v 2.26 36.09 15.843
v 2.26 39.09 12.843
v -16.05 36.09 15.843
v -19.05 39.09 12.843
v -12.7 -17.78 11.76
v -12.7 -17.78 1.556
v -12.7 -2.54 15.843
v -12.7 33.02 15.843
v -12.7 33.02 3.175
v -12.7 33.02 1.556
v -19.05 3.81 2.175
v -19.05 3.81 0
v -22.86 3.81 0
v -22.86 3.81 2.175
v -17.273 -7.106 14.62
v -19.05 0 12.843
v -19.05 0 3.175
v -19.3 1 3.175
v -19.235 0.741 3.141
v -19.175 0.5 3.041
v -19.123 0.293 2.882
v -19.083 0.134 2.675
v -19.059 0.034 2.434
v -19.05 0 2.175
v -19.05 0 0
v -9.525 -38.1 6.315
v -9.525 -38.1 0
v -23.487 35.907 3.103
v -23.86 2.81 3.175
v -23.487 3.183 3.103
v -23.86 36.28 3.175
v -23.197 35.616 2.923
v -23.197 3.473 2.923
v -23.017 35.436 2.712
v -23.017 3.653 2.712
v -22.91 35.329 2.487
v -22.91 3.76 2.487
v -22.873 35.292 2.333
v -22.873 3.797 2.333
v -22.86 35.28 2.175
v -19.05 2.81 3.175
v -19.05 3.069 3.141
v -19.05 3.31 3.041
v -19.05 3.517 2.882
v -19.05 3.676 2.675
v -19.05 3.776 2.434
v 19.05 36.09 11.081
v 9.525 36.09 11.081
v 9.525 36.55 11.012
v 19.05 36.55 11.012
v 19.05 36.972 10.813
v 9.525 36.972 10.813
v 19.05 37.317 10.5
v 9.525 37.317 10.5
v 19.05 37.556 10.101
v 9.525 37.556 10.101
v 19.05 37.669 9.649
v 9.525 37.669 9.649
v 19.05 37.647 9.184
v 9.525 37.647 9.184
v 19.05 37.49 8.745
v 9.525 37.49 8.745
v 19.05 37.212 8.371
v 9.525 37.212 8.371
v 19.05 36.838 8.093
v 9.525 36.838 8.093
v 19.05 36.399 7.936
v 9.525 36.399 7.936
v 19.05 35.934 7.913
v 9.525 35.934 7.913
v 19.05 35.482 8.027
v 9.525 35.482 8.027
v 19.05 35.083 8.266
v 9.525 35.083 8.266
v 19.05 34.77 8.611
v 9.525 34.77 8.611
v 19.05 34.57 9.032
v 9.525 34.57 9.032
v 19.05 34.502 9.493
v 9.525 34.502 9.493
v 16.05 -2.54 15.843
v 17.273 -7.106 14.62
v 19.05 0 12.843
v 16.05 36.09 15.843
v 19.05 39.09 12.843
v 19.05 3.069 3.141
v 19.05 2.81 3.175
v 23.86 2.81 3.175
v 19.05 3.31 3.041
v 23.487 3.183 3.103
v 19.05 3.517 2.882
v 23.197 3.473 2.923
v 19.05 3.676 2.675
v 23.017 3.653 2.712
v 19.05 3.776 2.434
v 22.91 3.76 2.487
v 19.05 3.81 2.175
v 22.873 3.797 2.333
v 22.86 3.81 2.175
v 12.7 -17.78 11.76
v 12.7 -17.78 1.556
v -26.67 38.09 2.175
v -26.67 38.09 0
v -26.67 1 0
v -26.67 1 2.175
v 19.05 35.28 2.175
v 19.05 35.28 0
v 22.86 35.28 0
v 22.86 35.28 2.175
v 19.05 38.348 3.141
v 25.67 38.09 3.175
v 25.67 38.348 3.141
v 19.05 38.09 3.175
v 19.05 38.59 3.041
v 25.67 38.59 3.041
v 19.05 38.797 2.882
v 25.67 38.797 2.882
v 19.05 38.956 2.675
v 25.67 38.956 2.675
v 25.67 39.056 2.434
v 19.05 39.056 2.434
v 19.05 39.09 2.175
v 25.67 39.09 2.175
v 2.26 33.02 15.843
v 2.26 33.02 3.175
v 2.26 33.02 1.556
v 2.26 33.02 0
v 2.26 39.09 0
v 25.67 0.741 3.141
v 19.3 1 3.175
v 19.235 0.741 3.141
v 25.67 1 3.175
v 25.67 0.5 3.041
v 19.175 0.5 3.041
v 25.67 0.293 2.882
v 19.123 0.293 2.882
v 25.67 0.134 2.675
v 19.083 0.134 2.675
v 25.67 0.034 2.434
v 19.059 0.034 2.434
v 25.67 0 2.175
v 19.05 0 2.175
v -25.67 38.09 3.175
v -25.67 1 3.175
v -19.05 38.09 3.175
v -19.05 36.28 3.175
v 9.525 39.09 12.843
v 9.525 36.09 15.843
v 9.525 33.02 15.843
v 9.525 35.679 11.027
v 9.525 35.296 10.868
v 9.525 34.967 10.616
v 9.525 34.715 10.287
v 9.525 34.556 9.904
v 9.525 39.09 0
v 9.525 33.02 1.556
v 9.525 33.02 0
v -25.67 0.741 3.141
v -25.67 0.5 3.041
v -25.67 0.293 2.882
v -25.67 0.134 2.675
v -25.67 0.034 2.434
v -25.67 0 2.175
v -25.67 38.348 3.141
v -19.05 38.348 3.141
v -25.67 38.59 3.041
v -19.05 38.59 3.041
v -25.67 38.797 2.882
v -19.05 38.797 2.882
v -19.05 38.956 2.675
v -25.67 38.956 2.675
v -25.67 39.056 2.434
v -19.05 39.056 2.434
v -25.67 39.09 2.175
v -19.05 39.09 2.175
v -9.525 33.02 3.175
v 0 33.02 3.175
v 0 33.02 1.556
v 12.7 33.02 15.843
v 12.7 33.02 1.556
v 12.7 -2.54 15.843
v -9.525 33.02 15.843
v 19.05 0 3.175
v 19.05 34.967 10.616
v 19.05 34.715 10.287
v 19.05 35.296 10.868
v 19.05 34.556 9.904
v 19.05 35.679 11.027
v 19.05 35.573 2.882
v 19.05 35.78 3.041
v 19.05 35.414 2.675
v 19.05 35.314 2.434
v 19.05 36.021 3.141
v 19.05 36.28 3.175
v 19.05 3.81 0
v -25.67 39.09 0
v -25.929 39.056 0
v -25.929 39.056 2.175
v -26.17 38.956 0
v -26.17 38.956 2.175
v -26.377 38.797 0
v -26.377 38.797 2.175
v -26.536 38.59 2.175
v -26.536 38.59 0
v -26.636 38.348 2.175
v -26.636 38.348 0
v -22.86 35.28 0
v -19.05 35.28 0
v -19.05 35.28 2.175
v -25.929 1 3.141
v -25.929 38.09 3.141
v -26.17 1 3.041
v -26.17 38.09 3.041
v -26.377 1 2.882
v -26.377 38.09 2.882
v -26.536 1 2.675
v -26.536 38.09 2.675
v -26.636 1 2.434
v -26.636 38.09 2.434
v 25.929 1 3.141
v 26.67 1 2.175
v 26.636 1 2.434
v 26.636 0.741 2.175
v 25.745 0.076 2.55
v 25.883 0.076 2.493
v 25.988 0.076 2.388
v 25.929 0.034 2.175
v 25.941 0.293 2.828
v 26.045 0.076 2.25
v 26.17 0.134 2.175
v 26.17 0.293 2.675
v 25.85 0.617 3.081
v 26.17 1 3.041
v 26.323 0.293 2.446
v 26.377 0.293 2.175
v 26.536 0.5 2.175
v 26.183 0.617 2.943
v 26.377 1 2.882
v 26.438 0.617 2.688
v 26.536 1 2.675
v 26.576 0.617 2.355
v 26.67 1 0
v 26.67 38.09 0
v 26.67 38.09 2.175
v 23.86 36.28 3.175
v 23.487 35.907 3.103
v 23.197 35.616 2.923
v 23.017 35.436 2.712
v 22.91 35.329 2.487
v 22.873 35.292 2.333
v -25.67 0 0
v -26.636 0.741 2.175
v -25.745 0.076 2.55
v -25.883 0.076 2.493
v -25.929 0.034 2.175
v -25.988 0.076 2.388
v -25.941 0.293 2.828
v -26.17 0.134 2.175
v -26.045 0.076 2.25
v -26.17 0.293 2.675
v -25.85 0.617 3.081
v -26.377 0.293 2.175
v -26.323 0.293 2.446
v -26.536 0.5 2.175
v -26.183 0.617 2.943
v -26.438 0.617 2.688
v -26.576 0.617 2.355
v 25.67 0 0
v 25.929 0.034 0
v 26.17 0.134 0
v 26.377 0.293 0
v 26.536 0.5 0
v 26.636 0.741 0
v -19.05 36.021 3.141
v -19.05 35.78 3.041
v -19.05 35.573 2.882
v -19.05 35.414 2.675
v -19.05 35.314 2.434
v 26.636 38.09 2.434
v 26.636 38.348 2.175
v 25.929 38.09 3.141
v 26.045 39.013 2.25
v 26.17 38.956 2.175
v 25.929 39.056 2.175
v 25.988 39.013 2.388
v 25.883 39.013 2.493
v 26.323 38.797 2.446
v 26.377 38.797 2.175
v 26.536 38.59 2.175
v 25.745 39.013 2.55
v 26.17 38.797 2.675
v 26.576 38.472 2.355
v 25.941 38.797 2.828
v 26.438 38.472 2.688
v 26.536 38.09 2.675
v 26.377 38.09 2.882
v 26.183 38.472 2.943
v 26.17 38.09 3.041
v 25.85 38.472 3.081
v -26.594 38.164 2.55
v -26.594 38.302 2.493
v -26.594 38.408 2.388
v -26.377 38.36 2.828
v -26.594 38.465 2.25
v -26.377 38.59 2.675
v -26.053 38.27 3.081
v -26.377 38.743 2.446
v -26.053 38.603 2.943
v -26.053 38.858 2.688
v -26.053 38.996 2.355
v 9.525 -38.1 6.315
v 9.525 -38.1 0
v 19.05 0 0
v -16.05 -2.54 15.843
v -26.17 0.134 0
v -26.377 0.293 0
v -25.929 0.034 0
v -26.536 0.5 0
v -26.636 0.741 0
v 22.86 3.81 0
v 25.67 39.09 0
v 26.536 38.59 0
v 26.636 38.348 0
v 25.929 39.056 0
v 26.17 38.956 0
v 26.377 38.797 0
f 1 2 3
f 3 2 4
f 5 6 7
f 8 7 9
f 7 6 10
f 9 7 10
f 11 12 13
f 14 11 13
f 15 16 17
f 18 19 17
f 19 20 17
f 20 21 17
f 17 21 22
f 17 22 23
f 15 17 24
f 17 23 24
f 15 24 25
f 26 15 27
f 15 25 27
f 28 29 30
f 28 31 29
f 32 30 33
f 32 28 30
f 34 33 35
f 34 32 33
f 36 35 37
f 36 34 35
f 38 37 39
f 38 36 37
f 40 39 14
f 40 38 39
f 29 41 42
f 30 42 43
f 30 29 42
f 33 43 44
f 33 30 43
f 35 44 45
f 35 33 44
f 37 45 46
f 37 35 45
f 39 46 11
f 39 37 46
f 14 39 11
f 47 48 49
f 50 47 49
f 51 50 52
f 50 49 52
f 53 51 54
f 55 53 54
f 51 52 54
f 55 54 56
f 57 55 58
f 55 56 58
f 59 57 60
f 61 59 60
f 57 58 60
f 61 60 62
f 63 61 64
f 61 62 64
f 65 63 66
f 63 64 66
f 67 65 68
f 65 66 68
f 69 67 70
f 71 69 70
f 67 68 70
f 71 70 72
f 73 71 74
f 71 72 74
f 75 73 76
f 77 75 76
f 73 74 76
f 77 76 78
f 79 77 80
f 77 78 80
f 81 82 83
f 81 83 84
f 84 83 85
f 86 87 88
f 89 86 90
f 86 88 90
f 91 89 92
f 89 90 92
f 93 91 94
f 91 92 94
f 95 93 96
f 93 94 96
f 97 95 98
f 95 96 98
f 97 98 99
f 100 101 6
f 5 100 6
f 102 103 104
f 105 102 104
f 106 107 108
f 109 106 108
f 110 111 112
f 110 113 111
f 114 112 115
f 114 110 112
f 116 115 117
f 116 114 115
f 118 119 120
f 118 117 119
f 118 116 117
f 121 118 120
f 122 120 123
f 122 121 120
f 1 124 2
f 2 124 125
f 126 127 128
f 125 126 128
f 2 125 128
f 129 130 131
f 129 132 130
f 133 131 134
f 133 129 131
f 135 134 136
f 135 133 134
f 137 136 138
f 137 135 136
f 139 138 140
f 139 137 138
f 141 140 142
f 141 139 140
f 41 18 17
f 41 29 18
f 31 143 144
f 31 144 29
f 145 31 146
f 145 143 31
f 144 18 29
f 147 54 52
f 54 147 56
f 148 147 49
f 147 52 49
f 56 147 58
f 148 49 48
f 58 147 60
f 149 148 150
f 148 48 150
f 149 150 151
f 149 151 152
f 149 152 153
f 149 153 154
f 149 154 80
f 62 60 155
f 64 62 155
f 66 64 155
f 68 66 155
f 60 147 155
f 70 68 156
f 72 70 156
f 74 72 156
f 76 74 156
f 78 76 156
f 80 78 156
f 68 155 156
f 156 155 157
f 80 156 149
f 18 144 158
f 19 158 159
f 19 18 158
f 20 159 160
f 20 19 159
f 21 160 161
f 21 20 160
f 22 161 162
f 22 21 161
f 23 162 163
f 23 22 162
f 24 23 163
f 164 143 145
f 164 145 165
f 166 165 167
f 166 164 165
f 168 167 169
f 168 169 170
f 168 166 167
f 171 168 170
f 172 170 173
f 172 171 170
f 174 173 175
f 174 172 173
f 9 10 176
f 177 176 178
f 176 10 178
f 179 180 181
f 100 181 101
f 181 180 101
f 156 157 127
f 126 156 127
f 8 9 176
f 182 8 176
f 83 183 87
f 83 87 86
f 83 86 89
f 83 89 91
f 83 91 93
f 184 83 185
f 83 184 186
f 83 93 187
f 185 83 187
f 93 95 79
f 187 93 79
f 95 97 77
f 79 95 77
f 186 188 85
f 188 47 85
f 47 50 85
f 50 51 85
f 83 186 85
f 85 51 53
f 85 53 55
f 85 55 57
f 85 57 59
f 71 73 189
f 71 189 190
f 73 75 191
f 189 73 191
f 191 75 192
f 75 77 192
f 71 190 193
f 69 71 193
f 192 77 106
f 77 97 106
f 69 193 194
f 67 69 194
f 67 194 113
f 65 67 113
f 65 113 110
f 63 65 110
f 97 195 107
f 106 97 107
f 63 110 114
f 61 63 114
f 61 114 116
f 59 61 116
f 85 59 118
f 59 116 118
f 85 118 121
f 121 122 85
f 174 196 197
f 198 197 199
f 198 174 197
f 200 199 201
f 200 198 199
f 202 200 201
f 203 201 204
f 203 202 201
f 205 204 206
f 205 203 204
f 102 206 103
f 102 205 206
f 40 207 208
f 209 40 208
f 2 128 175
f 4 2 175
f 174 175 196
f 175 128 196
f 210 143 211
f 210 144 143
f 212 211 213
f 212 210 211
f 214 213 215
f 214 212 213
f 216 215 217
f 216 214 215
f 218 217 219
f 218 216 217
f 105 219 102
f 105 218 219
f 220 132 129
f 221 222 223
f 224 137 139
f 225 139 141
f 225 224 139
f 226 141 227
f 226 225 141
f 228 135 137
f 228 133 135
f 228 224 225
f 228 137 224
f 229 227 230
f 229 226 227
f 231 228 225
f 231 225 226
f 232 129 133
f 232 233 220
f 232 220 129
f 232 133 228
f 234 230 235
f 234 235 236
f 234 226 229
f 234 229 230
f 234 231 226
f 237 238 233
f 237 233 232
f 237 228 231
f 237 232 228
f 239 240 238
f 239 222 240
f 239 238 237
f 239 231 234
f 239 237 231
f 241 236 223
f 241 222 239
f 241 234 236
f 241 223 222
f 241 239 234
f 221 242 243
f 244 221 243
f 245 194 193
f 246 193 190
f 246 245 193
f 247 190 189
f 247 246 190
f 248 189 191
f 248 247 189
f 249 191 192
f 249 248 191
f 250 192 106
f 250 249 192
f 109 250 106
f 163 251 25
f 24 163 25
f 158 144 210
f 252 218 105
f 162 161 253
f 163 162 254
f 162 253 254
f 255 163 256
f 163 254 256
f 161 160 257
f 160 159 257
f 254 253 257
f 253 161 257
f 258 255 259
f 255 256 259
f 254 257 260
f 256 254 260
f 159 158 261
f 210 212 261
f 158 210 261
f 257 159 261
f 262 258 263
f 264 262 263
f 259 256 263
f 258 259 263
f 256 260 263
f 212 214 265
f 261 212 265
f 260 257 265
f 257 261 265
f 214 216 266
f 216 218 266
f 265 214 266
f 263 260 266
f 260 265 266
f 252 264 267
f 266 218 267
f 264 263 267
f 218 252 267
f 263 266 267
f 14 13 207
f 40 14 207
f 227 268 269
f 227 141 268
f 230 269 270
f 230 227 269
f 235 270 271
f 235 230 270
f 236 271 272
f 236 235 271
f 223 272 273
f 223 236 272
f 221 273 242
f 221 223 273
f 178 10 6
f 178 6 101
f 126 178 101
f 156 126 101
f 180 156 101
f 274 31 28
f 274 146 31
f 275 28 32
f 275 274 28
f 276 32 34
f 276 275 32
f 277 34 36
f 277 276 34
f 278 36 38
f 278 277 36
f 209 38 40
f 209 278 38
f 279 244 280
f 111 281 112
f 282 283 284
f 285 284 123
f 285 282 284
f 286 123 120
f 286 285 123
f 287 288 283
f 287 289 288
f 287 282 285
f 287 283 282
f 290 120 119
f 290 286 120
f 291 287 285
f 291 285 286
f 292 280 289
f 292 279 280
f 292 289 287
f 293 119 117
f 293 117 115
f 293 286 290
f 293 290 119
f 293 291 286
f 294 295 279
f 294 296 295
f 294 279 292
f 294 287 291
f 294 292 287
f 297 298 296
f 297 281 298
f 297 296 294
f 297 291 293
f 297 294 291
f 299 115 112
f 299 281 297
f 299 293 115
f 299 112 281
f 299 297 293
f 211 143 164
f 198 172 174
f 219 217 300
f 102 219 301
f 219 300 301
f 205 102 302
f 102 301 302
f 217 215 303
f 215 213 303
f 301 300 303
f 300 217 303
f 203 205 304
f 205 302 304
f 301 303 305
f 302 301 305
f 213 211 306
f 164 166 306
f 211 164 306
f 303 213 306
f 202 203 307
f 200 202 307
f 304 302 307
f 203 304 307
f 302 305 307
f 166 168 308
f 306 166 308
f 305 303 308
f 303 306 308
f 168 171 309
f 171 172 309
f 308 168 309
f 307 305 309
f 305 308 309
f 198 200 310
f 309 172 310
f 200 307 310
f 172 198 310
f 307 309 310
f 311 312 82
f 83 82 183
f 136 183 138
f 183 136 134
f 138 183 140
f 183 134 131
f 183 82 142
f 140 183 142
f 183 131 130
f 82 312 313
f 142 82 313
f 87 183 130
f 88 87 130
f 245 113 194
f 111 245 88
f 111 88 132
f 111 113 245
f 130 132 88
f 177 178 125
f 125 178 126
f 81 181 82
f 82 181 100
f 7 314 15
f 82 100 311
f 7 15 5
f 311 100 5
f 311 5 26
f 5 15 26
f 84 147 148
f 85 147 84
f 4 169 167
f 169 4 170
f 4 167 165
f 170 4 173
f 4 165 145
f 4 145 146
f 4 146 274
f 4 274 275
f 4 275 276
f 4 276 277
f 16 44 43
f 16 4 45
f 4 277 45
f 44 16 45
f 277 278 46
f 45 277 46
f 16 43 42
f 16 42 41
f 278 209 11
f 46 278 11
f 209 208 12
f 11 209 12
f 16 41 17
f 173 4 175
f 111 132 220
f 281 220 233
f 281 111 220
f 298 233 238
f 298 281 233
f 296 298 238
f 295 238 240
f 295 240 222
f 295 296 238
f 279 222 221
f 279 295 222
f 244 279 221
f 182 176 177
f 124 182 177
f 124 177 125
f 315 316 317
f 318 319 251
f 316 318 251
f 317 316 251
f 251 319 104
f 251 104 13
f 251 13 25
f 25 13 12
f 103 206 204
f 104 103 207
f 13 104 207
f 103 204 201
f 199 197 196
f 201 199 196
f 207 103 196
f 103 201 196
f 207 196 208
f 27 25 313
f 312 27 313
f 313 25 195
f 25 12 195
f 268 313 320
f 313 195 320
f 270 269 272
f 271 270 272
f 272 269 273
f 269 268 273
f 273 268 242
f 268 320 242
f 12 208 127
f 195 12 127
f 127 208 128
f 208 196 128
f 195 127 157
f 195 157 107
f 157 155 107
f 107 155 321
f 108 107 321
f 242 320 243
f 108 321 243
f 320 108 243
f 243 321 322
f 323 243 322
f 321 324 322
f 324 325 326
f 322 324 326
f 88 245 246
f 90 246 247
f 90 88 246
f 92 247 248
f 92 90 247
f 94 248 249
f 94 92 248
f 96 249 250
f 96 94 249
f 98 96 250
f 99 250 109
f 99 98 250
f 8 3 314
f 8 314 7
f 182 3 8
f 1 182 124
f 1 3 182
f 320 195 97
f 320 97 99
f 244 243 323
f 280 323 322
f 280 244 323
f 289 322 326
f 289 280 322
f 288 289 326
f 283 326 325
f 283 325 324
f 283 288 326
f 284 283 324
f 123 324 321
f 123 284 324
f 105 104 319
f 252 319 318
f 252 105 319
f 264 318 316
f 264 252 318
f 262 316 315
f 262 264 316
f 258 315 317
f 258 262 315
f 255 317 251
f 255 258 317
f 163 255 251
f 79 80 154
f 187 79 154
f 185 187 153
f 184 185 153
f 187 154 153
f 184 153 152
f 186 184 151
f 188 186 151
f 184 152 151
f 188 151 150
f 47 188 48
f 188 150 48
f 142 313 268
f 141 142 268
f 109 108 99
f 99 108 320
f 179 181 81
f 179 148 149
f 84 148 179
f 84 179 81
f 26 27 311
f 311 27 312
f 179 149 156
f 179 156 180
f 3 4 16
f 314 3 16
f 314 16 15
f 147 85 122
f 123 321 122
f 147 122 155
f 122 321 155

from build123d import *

# Parameters (mm, degrees)
F0_W        = 9.525
F0_H        = 13.4751944874
F0_W_2      = 3.175
F0_H_2      = 15.7348055126
F0_H_3      = 17.78
F0_H_4      = 3.81
F1_DEPTH    = 1.55575
F0_W_3      = 3.81
F0_H_5      = 31.4696110251
F0_W_4      = 6.35
F0_H_6      = 1.27
F0_H_7      = 19.05
F0_H_8      = 2.2596110251
F0_W_5      = 2.2601685487
F2_DEPTH    = 3.175
F3_R        = 1
F4_DEPTH    = 15.84325
F5_SIZE     = 3
F6_T1_DEPTH = 203.7288380727
F8_DEPTH    = 25.4


# Not quite as in the source:
# - a fillet or chamfer that OpenCascade refuses, or shapes differently, is made with other operations: its cross-section is extruded or revolved along the edge and cut away or added


with BuildPart() as f1:
    # F0 (on Top) → F1 (new body)
    with BuildSketch(Plane.XY):
        with Locations((-4.7625, 26.2824027563)):
            Rectangle(F0_W, F0_H)
        with Locations((-11.1125, 26.2824027563)):
            Rectangle(F0_W_2, F0_H)
        with Locations((-11.1125, 11.6774027563)):
            Rectangle(F0_W_2, F0_H_2)
        with Locations((-4.7625, 11.6774027563)):
            Rectangle(F0_W, F0_H_2)
        with Locations((4.7625, 11.6774027563)):
            Rectangle(F0_W, F0_H_2)
        with Locations((11.1125, 11.6774027563)):
            Rectangle(F0_W_2, F0_H_2)
        with Locations((11.1125, 26.2824027563)):
            Rectangle(F0_W_2, F0_H)
        Polygon((0, 33.02), (0, 19.5448055126), (9.525, 19.5448055126), (9.525, 33.02), (2.2601685487, 33.02), align=None)
        with Locations((-4.7625, -8.89)):
            Rectangle(F0_W, F0_H_3)
        with Locations((4.7625, -8.89)):
            Rectangle(F0_W, F0_H_3)
        with Locations((11.1125, -8.89)):
            Rectangle(F0_W_2, F0_H_3)
        with Locations((-11.1125, -8.89)):
            Rectangle(F0_W_2, F0_H_3)
        with Locations((-11.1125, 1.905)):
            Rectangle(F0_W_2, F0_H_4)
        with Locations((-4.7625, 1.905)):
            Rectangle(F0_W, F0_H_4)
        with Locations((4.7625, 1.905)):
            Rectangle(F0_W, F0_H_4)
        with Locations((11.1125, 1.905)):
            Rectangle(F0_W_2, F0_H_4)
    extrude(amount=F1_DEPTH)

    # F0 (on Top) → F2 (join)
    with BuildSketch(Plane.XY):
        Polygon((-12.7, 33.02), (-9.525, 33.02), (-9.525, 35.2796110251), (-19.05, 35.2796110251), (-19.05, 19.5448055126), (-12.7, 19.5448055126), align=None)
        with Locations((-14.2875, 37.1846110251)):
            Rectangle(F0_W, F0_H_4)
        with Locations((-20.955, 37.1846110251)):
            Rectangle(F0_W_3, F0_H_4)
        with Locations((-24.765, 37.1846110251)):
            Rectangle(F0_W_3, F0_H_4)
        with Locations((-24.765, 19.5448055126)):
            Rectangle(F0_W_3, F0_H_5)
        with Locations((-24.765, 1.905)):
            Rectangle(F0_W_3, F0_H_4)
        with Locations((-20.955, 1.905)):
            Rectangle(F0_W_3, F0_H_4)
        with Locations((-15.875, 1.905)):
            Rectangle(F0_W_4, F0_H_4)
        with Locations((-15.875, 11.6774027563)):
            Rectangle(F0_W_4, F0_H_2)
        Polygon((-9.525, -19.05), (-9.525, -17.78), (-12.7, -17.78), (-12.7, 0), (-19.05, 0), (-14.2875, -19.05), align=None)
        with Locations((-4.7625, -18.415)):
            Rectangle(F0_W, F0_H_6)
        with Locations((4.7625, -18.415)):
            Rectangle(F0_W, F0_H_6)
        Polygon((12.7, -17.78), (9.525, -17.78), (9.525, -19.05), (14.2875, -19.05), (19.05, 0), (12.7, 0), align=None)
        Polygon((14.2875, -19.05), (9.525, -19.05), (9.525, -38.1), align=None)
        Polygon((-9.525, -38.1), (-9.525, -19.05), (-14.2875, -19.05), align=None)
        with Locations((-4.7625, -28.575)):
            Rectangle(F0_W, F0_H_7)
        with Locations((4.7625, -28.575)):
            Rectangle(F0_W, F0_H_7)
        with Locations((15.875, 1.905)):
            Rectangle(F0_W_4, F0_H_4)
        with Locations((15.875, 11.6774027563)):
            Rectangle(F0_W_4, F0_H_2)
        Polygon((9.525, 35.2796110251), (9.525, 33.02), (12.7, 33.02), (12.7, 19.5448055126), (19.05, 19.5448055126), (19.05, 35.2796110251), align=None)
        with Locations((-4.7625, 34.1498055126)):
            Rectangle(F0_W, F0_H_8)
        with Locations((-4.7625, 37.1846110251)):
            Rectangle(F0_W, F0_H_4)
        with Locations((1.1300842743, 37.1846110251)):
            Rectangle(F0_W_5, F0_H_4)
        with Locations((14.2875, 37.1846110251)):
            Rectangle(F0_W, F0_H_4)
        with Locations((20.955, 37.1846110251)):
            Rectangle(F0_W_3, F0_H_4)
        with Locations((24.765, 37.1846110251)):
            Rectangle(F0_W_3, F0_H_4)
        with Locations((24.765, 19.5448055126)):
            Rectangle(F0_W_3, F0_H_5)
        with Locations((24.765, 1.905)):
            Rectangle(F0_W_3, F0_H_4)
        with Locations((20.955, 1.905)):
            Rectangle(F0_W_3, F0_H_4)
        with Locations((1.1300842743, 34.1498055126)):
            Rectangle(F0_W_5, F0_H_8)
    extrude(amount=F2_DEPTH)

    # F3
    f3_edges = [f1.edges().sort_by_distance(p)[0] for p in [
        (26.67, 19.544806, 3.175),
        (22.86, 0, 3.175),
        (26.67, 0, 1.5875),
        (26.67, 39.089611, 1.5875),
        (-12.204916, 39.089611, 3.175),
        (18.0975, 39.089611, 3.175),
        (20.955, 35.279611, 3.175),
        (20.955, 3.81, 3.175),
        (22.86, 19.544806, 3.175),
        (-26.67, 19.544806, 3.175),
        (-22.86, 0, 3.175),
        (-26.67, 0, 1.5875),
        (-22.86, 19.544806, 3.175),
        (-20.955, 35.279611, 3.175),
        (-26.67, 39.089611, 1.5875),
        (-20.955, 3.81, 3.175),
    ]]
    fillet(f3_edges, radius=F3_R)

    # F0 (on Top) → F4 (join)
    with BuildSketch(Plane.XY):
        with Locations((-14.2875, 37.1846110251)):
            Rectangle(F0_W, F0_H_4)
        Polygon((-12.7, 33.02), (-9.525, 33.02), (-9.525, 35.2796110251), (-19.05, 35.2796110251), (-19.05, 19.5448055126), (-12.7, 19.5448055126), align=None)
        with Locations((-4.7625, 34.1498055126)):
            Rectangle(F0_W, F0_H_8)
        with Locations((-4.7625, 37.1846110251)):
            Rectangle(F0_W, F0_H_4)
        with Locations((1.1300842743, 37.1846110251)):
            Rectangle(F0_W_5, F0_H_4)
        with Locations((1.1300842743, 34.1498055126)):
            Rectangle(F0_W_5, F0_H_8)
        with Locations((14.2875, 37.1846110251)):
            Rectangle(F0_W, F0_H_4)
        Polygon((9.525, 35.2796110251), (9.525, 33.02), (12.7, 33.02), (12.7, 19.5448055126), (19.05, 19.5448055126), (19.05, 35.2796110251), align=None)
        with Locations((15.875, 11.6774027563)):
            Rectangle(F0_W_4, F0_H_2)
        with Locations((15.875, 1.905)):
            Rectangle(F0_W_4, F0_H_4)
        Polygon((12.7, -17.78), (9.525, -17.78), (9.525, -19.05), (14.2875, -19.05), (19.05, 0), (12.7, 0), align=None)
        with Locations((4.7625, -18.415)):
            Rectangle(F0_W, F0_H_6)
        with Locations((-4.7625, -18.415)):
            Rectangle(F0_W, F0_H_6)
        Polygon((-9.525, -19.05), (-9.525, -17.78), (-12.7, -17.78), (-12.7, 0), (-19.05, 0), (-14.2875, -19.05), align=None)
        with Locations((-15.875, 11.6774027563)):
            Rectangle(F0_W_4, F0_H_2)
        with Locations((-15.875, 1.905)):
            Rectangle(F0_W_4, F0_H_4)
        Polygon((-9.525, -38.1), (-9.525, -19.05), (-14.2875, -19.05), align=None)
        Polygon((14.2875, -19.05), (9.525, -19.05), (9.525, -38.1), align=None)
        with Locations((4.7625, -28.575)):
            Rectangle(F0_W, F0_H_7)
        with Locations((-4.7625, -28.575)):
            Rectangle(F0_W, F0_H_7)
    extrude(amount=F4_DEPTH)

    # F5
    f5_edges = [f1.edges().sort_by_distance(p)[0] for p in [
        (-19.05, 19.544806, 15.84325),
        (-8.394916, 39.089611, 15.84325),
        (14.2875, 39.089611, 15.84325),
        (19.05, 19.544806, 15.84325),
    ]]
    chamfer(f5_edges, length=F5_SIZE)

    # F6: chamfer of 35.56 x 9.5282732829 on 1 edges, made by hand

    # F6_s2 → F6_t1 (cut)
    with BuildSketch(Plane.YZ.offset(-101.8644190363)):
        Polygon((-2.54, 15.84325), (-38.1, 6.3149767171), (-38.1, 15.84325), align=None)
    extrude(amount=F6_T1_DEPTH, mode=Mode.SUBTRACT)

    # F7 (on face) → F8 (cut)
    with BuildSketch(Plane(origin=(9.525, 0, 0), x_dir=(0, -1, 0), z_dir=(-1, 0, 0))):
        with BuildLine():
            ThreePointArc((-34.5021110251, 9.49325), (-34.96707901, 10.6157820151), (-36.0896110251, 11.08075))
            ThreePointArc((-36.0896110251, 11.08075), (-37.2121430402, 8.3707179849), (-34.5021110251, 9.49325))
        make_face()
    extrude(amount=-F8_DEPTH, mode=Mode.SUBTRACT)


solid = f1.part
